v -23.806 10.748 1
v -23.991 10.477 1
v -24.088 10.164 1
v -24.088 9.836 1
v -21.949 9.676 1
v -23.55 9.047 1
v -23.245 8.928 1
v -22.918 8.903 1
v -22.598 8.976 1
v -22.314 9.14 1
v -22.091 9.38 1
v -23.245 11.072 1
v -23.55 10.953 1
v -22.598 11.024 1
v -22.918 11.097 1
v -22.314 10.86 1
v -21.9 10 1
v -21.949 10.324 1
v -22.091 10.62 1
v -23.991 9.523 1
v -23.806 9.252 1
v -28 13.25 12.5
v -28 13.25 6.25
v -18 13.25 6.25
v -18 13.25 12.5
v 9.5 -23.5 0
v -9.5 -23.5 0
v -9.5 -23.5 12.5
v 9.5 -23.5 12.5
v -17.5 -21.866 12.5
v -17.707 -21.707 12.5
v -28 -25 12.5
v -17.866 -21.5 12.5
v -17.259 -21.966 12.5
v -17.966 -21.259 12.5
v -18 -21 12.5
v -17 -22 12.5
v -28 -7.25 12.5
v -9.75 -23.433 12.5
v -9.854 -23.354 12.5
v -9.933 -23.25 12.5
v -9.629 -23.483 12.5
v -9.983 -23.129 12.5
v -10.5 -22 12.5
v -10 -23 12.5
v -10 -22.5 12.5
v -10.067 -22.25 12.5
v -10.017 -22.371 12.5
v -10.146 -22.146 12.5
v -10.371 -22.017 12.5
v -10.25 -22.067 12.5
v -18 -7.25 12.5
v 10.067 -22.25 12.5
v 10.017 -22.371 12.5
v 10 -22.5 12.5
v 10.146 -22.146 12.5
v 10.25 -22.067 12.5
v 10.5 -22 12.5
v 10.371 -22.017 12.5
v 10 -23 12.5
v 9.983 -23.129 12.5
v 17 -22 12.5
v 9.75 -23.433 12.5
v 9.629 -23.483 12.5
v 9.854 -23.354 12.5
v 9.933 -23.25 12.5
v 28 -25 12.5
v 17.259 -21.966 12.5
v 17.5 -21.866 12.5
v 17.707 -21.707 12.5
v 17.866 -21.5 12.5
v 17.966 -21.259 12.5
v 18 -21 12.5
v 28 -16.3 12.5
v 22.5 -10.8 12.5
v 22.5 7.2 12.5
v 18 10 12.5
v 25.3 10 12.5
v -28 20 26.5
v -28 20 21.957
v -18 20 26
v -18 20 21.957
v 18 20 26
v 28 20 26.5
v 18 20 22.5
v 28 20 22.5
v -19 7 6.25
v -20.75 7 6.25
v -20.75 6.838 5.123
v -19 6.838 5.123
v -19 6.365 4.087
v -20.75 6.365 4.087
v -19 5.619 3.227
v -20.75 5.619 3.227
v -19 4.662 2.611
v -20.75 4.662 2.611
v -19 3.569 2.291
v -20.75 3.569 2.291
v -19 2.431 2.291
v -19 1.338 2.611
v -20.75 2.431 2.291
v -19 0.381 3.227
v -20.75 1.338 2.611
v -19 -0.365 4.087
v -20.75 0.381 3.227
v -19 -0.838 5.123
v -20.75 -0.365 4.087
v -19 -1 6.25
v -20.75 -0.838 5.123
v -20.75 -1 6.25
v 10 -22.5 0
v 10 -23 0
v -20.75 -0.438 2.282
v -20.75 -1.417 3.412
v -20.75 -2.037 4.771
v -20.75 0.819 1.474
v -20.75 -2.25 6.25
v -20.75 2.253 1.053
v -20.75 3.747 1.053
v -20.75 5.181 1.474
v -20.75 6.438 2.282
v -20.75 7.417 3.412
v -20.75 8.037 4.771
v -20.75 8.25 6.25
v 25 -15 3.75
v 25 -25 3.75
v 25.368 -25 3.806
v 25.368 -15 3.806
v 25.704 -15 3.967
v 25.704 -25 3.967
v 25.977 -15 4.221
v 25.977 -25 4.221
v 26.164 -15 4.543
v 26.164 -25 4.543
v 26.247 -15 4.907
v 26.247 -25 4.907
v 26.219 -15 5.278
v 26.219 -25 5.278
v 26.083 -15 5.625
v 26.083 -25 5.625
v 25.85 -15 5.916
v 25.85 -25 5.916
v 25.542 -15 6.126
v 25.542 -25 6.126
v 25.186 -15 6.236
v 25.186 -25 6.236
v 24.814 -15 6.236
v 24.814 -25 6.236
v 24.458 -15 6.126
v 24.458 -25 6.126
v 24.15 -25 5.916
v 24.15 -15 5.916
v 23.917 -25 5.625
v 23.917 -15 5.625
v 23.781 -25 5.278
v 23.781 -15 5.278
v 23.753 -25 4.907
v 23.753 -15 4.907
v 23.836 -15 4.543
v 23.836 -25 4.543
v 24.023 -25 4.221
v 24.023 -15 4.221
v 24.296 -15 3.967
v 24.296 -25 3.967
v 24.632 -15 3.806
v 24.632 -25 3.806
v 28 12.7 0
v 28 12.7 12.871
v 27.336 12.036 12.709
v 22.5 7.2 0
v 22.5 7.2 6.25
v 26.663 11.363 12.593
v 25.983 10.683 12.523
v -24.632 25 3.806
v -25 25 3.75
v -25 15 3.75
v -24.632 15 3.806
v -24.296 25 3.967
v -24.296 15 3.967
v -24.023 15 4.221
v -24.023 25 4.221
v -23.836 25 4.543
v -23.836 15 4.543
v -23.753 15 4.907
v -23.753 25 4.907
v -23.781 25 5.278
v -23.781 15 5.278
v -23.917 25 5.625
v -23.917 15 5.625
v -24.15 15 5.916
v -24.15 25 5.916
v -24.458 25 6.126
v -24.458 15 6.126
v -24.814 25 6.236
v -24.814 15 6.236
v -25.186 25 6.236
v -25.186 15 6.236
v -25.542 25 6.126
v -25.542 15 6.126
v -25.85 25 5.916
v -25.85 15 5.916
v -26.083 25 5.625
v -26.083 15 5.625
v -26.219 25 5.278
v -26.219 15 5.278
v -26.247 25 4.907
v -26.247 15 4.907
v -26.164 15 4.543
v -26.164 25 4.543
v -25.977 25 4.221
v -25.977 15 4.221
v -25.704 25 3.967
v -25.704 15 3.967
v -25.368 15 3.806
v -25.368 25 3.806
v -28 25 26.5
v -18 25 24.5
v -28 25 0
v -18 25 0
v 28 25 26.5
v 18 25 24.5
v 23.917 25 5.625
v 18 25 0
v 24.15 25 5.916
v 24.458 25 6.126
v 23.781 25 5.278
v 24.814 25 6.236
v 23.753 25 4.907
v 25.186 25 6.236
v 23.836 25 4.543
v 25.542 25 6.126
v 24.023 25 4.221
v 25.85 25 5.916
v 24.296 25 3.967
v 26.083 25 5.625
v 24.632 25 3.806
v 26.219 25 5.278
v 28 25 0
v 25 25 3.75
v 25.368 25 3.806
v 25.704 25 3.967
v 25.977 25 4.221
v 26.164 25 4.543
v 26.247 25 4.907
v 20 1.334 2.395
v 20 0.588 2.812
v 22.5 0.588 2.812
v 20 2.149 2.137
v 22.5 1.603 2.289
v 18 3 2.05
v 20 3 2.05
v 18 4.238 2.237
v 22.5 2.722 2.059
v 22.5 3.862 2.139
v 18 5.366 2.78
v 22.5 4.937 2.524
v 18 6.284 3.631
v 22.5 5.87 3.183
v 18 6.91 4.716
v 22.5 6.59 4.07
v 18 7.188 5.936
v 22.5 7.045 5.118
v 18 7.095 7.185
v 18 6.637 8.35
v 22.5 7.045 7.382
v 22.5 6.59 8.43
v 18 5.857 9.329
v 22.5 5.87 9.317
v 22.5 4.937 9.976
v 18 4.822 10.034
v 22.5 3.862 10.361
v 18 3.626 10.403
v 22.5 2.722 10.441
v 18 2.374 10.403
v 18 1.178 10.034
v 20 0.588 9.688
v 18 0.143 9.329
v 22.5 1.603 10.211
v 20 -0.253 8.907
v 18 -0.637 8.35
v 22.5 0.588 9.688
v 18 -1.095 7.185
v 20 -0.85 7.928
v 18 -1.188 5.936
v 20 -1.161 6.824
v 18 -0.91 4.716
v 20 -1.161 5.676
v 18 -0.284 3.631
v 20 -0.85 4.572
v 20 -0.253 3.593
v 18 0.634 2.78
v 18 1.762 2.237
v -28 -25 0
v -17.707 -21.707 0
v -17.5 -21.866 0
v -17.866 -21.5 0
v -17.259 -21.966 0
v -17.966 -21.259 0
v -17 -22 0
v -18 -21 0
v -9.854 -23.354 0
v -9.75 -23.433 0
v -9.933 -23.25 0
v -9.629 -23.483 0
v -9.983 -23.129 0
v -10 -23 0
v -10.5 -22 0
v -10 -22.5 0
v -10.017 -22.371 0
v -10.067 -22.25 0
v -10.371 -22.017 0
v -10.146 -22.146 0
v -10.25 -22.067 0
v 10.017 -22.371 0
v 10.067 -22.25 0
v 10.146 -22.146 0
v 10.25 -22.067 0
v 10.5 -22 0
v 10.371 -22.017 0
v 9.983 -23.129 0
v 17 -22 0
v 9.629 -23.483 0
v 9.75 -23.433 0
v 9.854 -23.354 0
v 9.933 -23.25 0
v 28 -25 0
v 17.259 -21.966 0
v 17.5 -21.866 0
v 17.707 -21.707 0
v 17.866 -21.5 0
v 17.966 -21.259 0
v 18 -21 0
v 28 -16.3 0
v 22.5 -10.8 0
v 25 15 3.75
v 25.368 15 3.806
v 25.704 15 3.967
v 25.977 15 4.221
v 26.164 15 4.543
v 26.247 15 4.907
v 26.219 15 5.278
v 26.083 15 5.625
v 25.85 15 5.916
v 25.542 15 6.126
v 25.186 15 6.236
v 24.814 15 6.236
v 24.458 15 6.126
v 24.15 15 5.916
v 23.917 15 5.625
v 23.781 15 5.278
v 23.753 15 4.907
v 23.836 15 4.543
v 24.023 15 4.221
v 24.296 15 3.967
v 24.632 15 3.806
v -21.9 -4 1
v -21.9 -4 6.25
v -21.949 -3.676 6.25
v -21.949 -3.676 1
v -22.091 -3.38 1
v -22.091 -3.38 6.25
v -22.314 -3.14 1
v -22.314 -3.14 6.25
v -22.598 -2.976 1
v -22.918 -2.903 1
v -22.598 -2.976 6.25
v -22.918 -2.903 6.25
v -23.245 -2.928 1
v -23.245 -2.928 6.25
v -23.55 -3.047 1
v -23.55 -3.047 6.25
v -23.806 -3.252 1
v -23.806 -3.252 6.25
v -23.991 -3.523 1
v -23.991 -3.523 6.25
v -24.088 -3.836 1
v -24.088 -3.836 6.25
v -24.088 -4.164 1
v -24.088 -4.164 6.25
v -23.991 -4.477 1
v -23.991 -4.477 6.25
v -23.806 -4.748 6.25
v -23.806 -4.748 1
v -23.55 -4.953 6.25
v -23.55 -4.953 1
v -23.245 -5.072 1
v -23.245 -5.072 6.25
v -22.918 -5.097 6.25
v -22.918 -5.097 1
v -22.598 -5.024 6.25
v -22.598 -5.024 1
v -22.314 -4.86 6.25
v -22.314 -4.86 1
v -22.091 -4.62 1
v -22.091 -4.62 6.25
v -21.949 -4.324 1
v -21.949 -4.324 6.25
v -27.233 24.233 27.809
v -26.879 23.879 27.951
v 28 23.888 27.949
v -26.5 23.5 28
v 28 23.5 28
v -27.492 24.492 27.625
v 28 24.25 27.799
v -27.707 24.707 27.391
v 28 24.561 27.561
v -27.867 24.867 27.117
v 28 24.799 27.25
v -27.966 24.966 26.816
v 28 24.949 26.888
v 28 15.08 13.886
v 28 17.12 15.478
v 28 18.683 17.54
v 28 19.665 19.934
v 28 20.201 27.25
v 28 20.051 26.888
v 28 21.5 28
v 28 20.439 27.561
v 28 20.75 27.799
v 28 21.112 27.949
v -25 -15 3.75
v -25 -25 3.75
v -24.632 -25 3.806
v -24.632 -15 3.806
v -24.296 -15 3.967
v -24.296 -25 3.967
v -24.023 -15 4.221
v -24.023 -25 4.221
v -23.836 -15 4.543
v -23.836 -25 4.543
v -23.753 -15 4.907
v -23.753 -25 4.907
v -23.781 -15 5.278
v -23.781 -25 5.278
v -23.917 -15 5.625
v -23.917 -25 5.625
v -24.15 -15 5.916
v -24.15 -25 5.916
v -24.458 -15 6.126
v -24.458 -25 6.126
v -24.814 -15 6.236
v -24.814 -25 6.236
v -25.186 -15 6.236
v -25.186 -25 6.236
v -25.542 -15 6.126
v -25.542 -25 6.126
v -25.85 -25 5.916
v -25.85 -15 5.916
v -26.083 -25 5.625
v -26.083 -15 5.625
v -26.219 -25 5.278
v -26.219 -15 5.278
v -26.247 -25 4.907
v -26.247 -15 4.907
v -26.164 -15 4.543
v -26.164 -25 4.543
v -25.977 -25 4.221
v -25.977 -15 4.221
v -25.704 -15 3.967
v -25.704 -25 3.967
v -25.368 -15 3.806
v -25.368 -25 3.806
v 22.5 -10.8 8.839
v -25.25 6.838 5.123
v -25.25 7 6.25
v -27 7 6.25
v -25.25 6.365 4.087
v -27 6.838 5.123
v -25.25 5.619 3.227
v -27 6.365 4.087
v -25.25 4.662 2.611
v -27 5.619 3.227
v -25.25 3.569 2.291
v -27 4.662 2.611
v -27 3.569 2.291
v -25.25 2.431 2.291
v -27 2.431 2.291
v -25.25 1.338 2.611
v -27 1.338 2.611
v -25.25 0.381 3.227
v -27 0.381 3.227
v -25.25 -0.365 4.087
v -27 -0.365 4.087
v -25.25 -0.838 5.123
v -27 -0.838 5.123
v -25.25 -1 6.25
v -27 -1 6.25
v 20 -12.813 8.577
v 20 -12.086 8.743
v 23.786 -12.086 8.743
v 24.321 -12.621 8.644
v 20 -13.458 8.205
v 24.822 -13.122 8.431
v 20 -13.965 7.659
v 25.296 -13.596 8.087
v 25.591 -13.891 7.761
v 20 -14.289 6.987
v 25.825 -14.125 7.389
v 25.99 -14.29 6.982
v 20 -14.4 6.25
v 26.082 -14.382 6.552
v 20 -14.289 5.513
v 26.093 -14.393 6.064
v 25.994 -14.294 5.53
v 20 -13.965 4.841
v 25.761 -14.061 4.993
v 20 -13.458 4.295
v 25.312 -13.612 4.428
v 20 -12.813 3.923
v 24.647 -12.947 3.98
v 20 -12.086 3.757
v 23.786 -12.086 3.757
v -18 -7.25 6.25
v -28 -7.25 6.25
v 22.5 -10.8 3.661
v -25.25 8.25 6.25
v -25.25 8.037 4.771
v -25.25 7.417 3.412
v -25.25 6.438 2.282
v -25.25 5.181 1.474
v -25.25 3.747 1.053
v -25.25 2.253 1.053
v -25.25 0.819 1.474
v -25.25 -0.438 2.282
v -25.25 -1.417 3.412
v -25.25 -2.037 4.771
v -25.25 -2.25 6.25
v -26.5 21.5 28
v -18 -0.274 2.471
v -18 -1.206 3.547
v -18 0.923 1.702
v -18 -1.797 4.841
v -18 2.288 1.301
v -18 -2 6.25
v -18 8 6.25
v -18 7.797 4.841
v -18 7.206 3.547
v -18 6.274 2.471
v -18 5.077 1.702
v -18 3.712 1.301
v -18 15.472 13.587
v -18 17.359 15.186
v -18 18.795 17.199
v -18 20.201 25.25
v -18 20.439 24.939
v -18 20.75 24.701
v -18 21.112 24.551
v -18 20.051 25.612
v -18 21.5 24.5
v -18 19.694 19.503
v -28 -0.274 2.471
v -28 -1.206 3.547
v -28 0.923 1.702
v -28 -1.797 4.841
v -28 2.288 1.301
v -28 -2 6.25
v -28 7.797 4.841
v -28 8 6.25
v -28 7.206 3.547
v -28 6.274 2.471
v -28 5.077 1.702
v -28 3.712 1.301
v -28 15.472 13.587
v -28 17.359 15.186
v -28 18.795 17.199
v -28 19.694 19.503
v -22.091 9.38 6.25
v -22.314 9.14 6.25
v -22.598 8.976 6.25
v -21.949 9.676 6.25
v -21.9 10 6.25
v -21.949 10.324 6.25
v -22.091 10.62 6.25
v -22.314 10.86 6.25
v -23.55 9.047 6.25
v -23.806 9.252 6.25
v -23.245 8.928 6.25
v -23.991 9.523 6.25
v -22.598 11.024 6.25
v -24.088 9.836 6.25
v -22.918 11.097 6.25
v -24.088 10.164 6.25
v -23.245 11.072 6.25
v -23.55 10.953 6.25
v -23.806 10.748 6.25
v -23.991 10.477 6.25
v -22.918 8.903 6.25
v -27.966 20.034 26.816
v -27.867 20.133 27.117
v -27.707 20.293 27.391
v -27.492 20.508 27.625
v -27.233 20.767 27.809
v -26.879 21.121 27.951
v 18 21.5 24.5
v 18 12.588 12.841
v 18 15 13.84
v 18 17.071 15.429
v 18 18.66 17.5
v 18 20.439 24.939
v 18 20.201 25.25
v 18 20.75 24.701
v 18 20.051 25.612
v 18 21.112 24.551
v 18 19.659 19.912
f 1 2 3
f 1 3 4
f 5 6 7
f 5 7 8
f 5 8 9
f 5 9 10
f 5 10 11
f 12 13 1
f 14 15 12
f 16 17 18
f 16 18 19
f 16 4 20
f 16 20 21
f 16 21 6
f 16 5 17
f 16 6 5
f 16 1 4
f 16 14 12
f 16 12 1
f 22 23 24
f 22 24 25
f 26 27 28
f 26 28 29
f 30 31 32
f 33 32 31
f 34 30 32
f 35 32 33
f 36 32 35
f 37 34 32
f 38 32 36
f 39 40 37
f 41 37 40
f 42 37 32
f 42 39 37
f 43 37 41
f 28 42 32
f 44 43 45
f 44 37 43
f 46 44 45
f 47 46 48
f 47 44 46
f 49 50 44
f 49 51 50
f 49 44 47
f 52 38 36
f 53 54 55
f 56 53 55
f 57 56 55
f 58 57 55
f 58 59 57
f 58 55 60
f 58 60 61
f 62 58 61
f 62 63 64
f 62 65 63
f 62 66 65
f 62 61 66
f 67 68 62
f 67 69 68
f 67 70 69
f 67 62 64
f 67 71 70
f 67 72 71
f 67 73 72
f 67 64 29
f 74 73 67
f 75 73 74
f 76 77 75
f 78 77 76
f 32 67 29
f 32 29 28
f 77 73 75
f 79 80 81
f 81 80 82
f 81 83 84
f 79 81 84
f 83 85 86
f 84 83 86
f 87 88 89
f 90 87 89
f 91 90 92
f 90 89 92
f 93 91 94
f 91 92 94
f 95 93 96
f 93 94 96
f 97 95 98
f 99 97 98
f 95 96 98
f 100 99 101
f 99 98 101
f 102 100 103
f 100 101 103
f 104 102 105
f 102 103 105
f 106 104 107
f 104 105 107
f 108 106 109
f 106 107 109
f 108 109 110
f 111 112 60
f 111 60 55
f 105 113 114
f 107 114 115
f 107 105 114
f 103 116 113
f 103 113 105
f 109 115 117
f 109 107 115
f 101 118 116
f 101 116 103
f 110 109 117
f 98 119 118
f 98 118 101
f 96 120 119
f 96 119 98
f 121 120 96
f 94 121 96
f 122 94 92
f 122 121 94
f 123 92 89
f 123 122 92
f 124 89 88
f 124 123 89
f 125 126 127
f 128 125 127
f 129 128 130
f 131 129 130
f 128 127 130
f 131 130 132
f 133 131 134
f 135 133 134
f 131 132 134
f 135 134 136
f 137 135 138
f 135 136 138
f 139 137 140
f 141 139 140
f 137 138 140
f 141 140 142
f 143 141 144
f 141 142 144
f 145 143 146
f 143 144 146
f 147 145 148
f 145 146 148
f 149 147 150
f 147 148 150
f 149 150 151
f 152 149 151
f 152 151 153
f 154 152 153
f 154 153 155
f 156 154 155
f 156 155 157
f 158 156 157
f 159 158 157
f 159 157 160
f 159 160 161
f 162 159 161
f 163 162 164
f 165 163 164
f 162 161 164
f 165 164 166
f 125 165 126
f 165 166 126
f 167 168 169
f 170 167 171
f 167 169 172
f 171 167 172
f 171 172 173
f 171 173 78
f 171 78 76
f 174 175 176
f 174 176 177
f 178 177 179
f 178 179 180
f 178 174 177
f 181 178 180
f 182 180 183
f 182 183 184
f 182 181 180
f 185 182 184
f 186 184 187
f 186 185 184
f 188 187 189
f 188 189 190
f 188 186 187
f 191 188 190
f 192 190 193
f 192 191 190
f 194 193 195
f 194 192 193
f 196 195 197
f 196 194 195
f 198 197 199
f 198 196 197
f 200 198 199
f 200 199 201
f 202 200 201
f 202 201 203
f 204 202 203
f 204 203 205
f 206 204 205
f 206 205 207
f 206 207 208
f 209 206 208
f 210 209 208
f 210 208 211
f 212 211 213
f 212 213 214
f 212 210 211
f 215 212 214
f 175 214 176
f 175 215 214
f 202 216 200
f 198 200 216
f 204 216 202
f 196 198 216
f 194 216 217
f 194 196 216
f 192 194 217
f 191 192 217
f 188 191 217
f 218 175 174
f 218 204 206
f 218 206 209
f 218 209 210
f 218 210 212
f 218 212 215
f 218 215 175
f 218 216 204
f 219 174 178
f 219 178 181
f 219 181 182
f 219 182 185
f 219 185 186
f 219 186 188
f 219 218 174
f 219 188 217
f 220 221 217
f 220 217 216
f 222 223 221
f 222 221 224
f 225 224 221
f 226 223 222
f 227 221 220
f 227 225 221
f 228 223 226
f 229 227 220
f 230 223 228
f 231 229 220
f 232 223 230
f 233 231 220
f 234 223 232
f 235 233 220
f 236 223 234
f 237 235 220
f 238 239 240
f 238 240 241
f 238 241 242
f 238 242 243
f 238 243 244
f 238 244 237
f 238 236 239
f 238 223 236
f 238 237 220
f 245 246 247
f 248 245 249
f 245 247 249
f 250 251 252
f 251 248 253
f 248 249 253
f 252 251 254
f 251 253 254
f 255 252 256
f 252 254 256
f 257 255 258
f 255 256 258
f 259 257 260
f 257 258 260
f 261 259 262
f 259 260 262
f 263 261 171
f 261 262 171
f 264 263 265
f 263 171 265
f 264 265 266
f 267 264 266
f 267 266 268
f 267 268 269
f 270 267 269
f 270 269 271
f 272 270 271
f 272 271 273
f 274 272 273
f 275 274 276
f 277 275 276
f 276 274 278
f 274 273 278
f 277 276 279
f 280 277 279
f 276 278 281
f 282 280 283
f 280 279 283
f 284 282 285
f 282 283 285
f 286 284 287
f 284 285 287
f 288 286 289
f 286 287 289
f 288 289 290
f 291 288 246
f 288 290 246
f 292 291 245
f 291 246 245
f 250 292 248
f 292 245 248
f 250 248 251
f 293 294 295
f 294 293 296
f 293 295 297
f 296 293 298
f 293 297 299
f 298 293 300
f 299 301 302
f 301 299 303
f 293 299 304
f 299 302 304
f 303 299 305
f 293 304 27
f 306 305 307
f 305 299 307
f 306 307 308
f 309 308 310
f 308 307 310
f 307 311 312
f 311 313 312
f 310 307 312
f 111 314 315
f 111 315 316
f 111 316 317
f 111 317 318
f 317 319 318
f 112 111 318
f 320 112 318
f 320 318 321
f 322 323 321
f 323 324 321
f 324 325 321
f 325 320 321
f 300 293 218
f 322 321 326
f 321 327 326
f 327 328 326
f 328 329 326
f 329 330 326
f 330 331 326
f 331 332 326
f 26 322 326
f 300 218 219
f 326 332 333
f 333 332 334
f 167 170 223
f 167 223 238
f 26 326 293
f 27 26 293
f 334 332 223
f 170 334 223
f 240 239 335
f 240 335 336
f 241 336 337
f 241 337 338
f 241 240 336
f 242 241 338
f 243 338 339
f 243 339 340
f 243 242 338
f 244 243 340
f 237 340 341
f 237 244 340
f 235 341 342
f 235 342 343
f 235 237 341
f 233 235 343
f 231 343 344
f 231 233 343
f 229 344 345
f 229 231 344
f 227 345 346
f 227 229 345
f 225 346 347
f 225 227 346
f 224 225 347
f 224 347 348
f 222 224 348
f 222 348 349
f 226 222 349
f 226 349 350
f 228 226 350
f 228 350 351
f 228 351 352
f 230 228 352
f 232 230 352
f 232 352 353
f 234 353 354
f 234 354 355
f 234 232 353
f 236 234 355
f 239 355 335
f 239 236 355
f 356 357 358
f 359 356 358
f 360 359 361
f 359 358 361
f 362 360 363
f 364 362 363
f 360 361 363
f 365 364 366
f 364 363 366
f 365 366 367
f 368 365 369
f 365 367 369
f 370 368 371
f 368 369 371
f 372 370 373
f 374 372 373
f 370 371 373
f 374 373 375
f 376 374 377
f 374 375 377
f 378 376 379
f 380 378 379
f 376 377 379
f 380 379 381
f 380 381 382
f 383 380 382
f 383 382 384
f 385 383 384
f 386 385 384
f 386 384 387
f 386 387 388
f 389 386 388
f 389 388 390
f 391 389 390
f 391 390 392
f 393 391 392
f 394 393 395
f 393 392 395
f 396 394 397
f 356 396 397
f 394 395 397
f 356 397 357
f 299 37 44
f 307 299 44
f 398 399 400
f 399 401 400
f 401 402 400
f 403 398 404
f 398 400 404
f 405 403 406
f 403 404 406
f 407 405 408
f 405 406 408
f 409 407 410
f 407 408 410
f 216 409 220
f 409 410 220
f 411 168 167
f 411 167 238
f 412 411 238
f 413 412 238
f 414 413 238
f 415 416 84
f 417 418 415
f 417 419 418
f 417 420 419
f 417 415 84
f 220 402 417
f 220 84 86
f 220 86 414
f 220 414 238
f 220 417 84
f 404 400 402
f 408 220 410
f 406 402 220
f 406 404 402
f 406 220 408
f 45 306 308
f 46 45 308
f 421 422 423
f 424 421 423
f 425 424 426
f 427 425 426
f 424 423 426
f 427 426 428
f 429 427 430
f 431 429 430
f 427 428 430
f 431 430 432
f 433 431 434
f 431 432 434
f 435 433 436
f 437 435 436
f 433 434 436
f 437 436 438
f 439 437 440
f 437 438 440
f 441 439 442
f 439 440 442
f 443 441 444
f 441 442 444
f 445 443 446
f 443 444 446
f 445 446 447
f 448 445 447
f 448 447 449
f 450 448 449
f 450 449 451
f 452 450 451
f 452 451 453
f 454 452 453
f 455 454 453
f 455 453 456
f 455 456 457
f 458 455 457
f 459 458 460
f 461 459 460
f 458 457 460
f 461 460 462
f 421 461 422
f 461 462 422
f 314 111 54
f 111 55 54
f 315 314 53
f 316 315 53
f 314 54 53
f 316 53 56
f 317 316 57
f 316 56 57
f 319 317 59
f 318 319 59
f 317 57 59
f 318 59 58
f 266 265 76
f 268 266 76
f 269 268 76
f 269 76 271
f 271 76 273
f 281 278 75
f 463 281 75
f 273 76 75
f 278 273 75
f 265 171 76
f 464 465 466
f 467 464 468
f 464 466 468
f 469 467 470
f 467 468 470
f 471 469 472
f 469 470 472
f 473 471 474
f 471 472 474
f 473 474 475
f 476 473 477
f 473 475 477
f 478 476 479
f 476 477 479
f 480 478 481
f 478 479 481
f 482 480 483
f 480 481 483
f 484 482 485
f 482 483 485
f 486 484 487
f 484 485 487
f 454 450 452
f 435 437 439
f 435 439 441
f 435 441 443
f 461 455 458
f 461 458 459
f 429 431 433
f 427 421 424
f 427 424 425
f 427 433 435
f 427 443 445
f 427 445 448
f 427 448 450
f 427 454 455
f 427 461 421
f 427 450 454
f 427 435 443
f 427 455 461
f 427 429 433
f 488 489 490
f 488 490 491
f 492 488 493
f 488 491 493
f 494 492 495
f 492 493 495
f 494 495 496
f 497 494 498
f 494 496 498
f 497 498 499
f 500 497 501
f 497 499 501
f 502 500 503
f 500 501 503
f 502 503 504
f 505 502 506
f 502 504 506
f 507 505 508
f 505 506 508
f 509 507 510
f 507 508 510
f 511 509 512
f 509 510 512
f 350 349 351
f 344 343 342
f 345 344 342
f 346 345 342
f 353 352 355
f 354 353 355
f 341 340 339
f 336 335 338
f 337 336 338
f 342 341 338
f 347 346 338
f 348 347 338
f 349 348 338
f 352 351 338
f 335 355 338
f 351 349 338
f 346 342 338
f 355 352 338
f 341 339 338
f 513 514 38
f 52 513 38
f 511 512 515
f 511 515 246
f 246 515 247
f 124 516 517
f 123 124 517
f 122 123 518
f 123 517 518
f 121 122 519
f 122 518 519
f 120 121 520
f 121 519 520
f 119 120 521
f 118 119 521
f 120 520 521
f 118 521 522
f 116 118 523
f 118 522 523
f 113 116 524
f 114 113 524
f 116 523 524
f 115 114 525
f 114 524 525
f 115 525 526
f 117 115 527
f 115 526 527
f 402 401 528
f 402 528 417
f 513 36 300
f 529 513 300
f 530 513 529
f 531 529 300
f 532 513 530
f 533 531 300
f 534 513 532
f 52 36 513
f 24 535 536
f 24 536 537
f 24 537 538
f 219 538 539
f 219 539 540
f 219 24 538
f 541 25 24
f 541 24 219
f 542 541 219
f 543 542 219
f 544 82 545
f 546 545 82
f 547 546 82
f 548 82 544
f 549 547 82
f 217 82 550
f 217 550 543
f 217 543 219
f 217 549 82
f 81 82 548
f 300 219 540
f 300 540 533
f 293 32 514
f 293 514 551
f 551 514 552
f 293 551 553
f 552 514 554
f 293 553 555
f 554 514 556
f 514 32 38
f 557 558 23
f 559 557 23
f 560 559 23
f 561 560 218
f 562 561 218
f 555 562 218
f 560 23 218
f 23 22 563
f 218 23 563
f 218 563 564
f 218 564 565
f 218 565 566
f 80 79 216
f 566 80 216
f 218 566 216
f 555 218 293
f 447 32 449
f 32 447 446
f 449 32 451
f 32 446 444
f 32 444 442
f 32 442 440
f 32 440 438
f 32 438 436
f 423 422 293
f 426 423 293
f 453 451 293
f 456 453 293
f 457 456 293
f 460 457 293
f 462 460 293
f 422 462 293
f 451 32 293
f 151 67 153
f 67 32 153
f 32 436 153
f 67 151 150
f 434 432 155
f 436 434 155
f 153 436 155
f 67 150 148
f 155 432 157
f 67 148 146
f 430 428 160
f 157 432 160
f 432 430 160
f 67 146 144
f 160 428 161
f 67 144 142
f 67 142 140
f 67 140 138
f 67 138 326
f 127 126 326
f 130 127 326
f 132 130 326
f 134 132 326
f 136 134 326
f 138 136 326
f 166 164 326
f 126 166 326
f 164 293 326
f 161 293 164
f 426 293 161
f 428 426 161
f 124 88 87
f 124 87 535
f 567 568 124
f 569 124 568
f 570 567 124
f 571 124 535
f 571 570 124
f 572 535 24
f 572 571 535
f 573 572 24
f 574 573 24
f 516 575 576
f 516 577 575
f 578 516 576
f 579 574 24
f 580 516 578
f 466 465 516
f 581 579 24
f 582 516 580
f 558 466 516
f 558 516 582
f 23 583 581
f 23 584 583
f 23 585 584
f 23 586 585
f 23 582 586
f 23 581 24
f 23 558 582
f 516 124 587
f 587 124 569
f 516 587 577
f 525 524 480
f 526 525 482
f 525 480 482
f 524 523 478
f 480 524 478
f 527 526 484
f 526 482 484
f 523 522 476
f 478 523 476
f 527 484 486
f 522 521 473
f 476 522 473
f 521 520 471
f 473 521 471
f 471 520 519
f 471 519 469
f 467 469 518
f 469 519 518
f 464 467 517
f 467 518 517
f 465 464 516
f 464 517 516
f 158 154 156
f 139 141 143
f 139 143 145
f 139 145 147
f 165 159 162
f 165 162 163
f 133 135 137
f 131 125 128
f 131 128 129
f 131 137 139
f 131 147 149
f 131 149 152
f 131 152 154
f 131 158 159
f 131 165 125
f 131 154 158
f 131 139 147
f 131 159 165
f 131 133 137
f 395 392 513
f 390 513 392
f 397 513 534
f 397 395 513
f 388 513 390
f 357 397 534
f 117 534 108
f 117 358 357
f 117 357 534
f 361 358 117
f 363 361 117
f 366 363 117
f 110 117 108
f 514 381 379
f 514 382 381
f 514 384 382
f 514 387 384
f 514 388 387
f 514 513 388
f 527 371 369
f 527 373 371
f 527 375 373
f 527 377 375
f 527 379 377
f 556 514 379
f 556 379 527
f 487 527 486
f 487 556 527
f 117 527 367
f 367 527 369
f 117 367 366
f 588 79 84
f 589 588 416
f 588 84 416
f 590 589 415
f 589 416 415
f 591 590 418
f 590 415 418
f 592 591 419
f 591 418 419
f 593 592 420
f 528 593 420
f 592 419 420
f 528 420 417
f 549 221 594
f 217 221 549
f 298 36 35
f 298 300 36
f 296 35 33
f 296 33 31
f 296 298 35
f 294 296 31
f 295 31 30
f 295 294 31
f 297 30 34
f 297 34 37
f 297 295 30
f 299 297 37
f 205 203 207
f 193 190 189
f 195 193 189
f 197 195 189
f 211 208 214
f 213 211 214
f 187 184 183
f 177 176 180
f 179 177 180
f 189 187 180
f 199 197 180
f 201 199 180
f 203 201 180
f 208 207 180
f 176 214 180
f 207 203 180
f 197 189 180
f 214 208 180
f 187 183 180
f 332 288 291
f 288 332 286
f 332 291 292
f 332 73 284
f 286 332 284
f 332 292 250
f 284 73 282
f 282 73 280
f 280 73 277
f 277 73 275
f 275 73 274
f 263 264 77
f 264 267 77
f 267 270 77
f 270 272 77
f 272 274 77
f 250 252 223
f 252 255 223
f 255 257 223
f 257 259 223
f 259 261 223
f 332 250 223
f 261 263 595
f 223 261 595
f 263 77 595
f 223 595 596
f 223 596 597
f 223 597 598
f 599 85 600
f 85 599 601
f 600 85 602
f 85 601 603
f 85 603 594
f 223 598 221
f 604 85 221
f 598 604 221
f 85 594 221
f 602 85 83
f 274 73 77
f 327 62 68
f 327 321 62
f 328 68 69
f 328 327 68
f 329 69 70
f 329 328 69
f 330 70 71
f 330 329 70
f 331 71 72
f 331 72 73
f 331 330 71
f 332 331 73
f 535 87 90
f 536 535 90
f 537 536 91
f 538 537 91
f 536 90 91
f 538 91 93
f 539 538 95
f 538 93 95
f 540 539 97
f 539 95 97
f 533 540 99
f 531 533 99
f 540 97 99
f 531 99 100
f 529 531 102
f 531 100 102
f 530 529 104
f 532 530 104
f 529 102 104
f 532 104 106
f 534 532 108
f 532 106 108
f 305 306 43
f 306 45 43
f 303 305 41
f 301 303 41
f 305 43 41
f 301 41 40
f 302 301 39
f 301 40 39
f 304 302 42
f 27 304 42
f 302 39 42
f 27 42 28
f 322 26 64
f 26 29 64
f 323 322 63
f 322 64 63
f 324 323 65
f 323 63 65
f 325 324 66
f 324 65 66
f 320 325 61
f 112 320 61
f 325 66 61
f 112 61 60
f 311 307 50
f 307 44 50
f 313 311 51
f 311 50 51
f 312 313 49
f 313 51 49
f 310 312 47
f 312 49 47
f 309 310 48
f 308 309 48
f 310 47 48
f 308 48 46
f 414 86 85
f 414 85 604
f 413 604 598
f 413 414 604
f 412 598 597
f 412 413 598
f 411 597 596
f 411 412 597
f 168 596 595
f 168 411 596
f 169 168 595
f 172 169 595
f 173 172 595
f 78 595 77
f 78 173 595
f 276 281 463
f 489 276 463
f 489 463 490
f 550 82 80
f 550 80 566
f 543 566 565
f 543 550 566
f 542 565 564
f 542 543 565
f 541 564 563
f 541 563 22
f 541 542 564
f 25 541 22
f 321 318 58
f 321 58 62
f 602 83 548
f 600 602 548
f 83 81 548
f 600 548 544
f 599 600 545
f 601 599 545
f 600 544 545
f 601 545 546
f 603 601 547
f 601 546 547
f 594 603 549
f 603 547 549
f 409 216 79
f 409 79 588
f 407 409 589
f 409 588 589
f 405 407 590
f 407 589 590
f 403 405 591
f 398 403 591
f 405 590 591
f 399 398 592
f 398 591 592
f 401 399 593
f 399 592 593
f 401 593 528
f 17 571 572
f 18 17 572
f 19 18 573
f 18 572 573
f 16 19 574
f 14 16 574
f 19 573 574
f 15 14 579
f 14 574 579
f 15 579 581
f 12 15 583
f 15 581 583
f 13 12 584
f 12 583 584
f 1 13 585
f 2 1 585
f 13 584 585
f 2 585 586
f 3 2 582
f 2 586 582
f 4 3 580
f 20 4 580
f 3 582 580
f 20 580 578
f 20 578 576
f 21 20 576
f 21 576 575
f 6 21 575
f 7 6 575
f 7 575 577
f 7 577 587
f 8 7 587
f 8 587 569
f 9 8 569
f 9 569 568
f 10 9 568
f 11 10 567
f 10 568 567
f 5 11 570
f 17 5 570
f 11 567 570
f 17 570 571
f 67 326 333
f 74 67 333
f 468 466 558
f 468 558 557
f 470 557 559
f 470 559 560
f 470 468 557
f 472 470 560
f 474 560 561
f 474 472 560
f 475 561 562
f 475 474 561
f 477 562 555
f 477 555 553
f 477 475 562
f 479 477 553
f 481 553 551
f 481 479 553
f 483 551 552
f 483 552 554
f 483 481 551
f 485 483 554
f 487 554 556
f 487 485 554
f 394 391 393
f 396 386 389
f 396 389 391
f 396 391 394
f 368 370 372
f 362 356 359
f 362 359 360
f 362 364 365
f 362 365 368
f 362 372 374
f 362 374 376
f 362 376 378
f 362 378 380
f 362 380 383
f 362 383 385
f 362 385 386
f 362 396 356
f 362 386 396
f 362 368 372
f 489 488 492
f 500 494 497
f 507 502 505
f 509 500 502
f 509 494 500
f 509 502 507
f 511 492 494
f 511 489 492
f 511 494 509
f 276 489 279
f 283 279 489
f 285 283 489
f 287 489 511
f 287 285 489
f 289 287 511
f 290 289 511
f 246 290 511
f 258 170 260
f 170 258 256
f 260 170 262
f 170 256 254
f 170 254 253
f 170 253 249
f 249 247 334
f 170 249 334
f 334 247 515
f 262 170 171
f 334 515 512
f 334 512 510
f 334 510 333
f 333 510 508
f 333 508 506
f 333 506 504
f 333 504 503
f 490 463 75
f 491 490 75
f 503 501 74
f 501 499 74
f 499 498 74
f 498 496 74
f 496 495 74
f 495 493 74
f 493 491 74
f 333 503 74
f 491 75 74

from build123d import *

# Parameters (mm, degrees)
SKETCH_1_W             = 56
SKETCH_1_H             = 50
EXTRUDE_487_DEPTH      = 12.5
SKETCH_3_W             = 36
SKETCH_3_H             = 46
CUT_EXTRUDE_730_DEPTH  = 40.563240514
SKETCH_11_R            = 1.25
CUT_EXTRUDE_984_DEPTH  = 10
CUT_EXTRUDE_1451_DEPTH = 8
CUT_EXTRUDE_1793_REACH = 64.588
SKETCH_4_R             = 4.2
SKETCH_6_R             = 4
CUT_EXTRUDE_1930_DEPTH = 10
SKETCH_7_W             = 6.25
SKETCH_7_H             = 20.5
CUT_EXTRUDE_2129_DEPTH = 10
SKETCH_8_R             = 5.25
CUT_EXTRUDE_2306_DEPTH = 2.25
SKETCH_9_R             = 1.1
CUT_EXTRUDE_2664_DEPTH = 5.25
CUT_EXTRUDE_3061_DEPTH = 40.563240514
CHAMFER_1_SIZE         = 1
FILLET_1_R             = 1
SKETCH_12_W            = 20
SKETCH_12_H            = 1.5
CUT_EXTRUDE_3473_DEPTH = 40.563240514
FILLET_2_R             = 0.5
CUT_EXTRUDE_4198_REACH = 41.563
SKETCH_13_W            = 36
SKETCH_13_H            = 1
EXTRUDE_4558_DEPTH     = 5
FILLET_3_R             = 10
FILLET_4_R             = 1.5


with BuildPart() as part:
    # Эскиз1 → Extrude 487 (new body)
    with BuildSketch(Plane.XY):
        Rectangle(SKETCH_1_W, SKETCH_1_H)
    extrude(amount=EXTRUDE_487_DEPTH)

    # Эскиз3 → Cut-Extrude 730 (cut, through all)
    with BuildSketch(Plane.XY.offset(12.5)):
        with Locations((0, 1)):
            Rectangle(SKETCH_3_W, SKETCH_3_H)
    extrude(amount=-CUT_EXTRUDE_730_DEPTH, mode=Mode.SUBTRACT)

    # Эскиз11 → Cut-Extrude 984 (cut)
    with BuildSketch(Plane.XZ.offset(25)):
        with Locations(Location((-25, 5, 0), (0, 0, 270))):
            Circle(SKETCH_11_R)
        with Locations(Location((25, 5, 0), (0, 0, 270))):
            Circle(SKETCH_11_R)
    cut_extrude_984 = extrude(amount=-CUT_EXTRUDE_984_DEPTH, mode=Mode.SUBTRACT)

    # Mirror 1028: Cut-Extrude 984 across plane
    add(cut_extrude_984.mirror(Plane.ZX), mode=Mode.SUBTRACT)

    # Эскиз5 → Cut-Extrude 1451 (cut)
    with BuildSketch(Plane(origin=(28, 0, 0), x_dir=(0, 0, -1), z_dir=(1, 0, 0))):
        with BuildLine():
            Line((-9.688027281, 0.587538929), (-8.743079599, -12.085887362))
            ThreePointArc((-8.743079599, -12.085887362), (-6.25, -14.4), (-3.756920401, -12.085887362))
            Line((-3.756920401, -12.085887362), (-2.811972719, 0.587538929))
            ThreePointArc((-2.811972719, 0.587538929), (-6.25, 7.2), (-9.688027281, 0.587538929))
        make_face()
    extrude(amount=-CUT_EXTRUDE_1451_DEPTH, mode=Mode.SUBTRACT)

    # Эскиз4 → Cut-Extrude 1793 (cut, up to next)
    with BuildSketch(Plane(origin=(28, 0, 0), x_dir=(0, 0, -1), z_dir=(1, 0, 0)), mode=Mode.PRIVATE) as cut_extrude_1793_sk1:
        with Locations((-6.25, 3)):
            Circle(SKETCH_4_R)
    cut_extrude_1793_tool1 = extrude(cut_extrude_1793_sk1.sketch, amount=-CUT_EXTRUDE_1793_REACH, mode=Mode.PRIVATE) & part.part
    add(cut_extrude_1793_tool1.solids().sort_by_distance((28, 3, 6.25))[0], mode=Mode.SUBTRACT)

    # Эскиз6 → Cut-Extrude 1930 (cut)
    with BuildSketch(Plane.ZY.offset(28)):
        with Locations((6.25, 3)):
            Circle(SKETCH_6_R)
    extrude(amount=-CUT_EXTRUDE_1930_DEPTH, mode=Mode.SUBTRACT)

    # Эскиз7 → Cut-Extrude 2129 (cut)
    with BuildSketch(Plane.ZY.offset(28)):
        with Locations((9.375, 3)):
            Rectangle(SKETCH_7_W, SKETCH_7_H)
    extrude(amount=-CUT_EXTRUDE_2129_DEPTH, mode=Mode.SUBTRACT)

    # Эскиз8 → Cut-Extrude 2306 (cut, symmetric)
    with BuildSketch(Plane.ZY.offset(23)):
        with Locations((6.25, 3)):
            Circle(SKETCH_8_R)
    extrude(amount=CUT_EXTRUDE_2306_DEPTH, both=True, mode=Mode.SUBTRACT)

    # Эскиз9 → Cut-Extrude 2664 (cut)
    with BuildSketch(Plane.XY.offset(6.25)):
        with Locations((-23, 10)):
            Circle(SKETCH_9_R)
        with Locations((-23, -4)):
            Circle(SKETCH_9_R)
    extrude(amount=-CUT_EXTRUDE_2664_DEPTH, mode=Mode.SUBTRACT)

    # Эскиз10 → Cut-Extrude 3061 (cut, through all)
    with BuildSketch(Plane.XY.offset(12.5)):
        Polygon((28, -16.3), (28, 12.7), (22.5, 7.2), (22.5, -10.8), align=None)
    extrude(amount=-CUT_EXTRUDE_3061_DEPTH, mode=Mode.SUBTRACT)

    # Фаска1
    chamfer_1_edges = [part.edges().sort_by_distance(p)[0] for p in [
        (-28, 3, 2.25),
        (-18, 3, 2.25),
    ]]
    chamfer(chamfer_1_edges, length=CHAMFER_1_SIZE)

    # Скругление1
    fillet_1_edges = [part.edges().sort_by_distance(p)[0] for p in [
        (18, -22, 6.25),
        (-18, -22, 6.25),
    ]]
    fillet(fillet_1_edges, radius=FILLET_1_R)

    # Эскиз12 → Cut-Extrude 3473 (cut, through all)
    with BuildSketch(Plane.XY):
        with Locations((0, -22.75)):
            Rectangle(SKETCH_12_W, SKETCH_12_H)
    extrude(amount=CUT_EXTRUDE_3473_DEPTH, mode=Mode.SUBTRACT)

    # Скругление2
    fillet_2_edges = [part.edges().sort_by_distance(p)[0] for p in [
        (-10, -22, 6.25),
        (-10, -23.5, 6.25),
        (10, -23.5, 6.25),
        (10, -22, 6.25),
    ]]
    fillet(fillet_2_edges, radius=FILLET_2_R)

    # Эскиз13 → Cut-Extrude 4198 (cut, up to next)
    with BuildSketch(Plane.XY.offset(12.5), mode=Mode.PRIVATE) as cut_extrude_4198_sk1:
        with Locations((0, 24.5)):
            Rectangle(SKETCH_13_W, SKETCH_13_H)
    cut_extrude_4198_tool1 = extrude(cut_extrude_4198_sk1.sketch, amount=-CUT_EXTRUDE_4198_REACH, mode=Mode.PRIVATE) & part.part
    add(cut_extrude_4198_tool1.solids().sort_by_distance((0, 24.5, 12.5))[0], mode=Mode.SUBTRACT)

    # Эскиз14 → Extrude 4558 (add)
    with BuildSketch(Plane(origin=(0, 25, 0), x_dir=(1, 0, 0), z_dir=(0, 1, 0))):
        Polygon((-28, -12.5), (-28, -28), (28, -28), (28, -12.5), (18, -12.5), (18, -24.5), (-18, -24.5), (-18, -12.5), align=None)
    extrude(amount=-EXTRUDE_4558_DEPTH)

    # Скругление3
    # the kernel refuses this fillet: 10 mm, written as the material it adds along each edge
    with BuildSketch(Plane(origin=(28, 20, 12.5), x_dir=(0, -1, 0), z_dir=(-1, 0, 0))) as fillet_3_piece_1_section:
        with BuildLine():
            CenterArc((FILLET_3_R, FILLET_3_R), FILLET_3_R, 180, 90)
            Line((0, FILLET_3_R), (0, 0))
            Line((0, 0), (FILLET_3_R, 0))
        make_face()
    fillet_3_piece_1 = extrude(amount=10, mode=Mode.PRIVATE)
    fillet_3_piece_1 = split(fillet_3_piece_1, bisect_by=Plane(origin=(31.65, 16.35, 12.5), z_dir=(-0.7071067811865515, 0.7071067811865436, 0)), keep=Keep.TOP, mode=Mode.PRIVATE)
    add(fillet_3_piece_1)
    with BuildSketch(Plane(origin=(-18, 20, 12.5), x_dir=(0, -1, 0), z_dir=(-1, 0, 0))) as fillet_3_piece_2:
        with BuildLine():
            CenterArc((10, 9.45714016), FILLET_3_R, 180, 71.034425011)
            Line((0, 9.45714016), (0, 0))
            Line((0, 0), (6.75, 0))
        make_face()
    extrude(amount=10)

    # Скругление4
    fillet_4_edges = [part.edges().sort_by_distance(p)[0] for p in [
        (0, 20, 24.5),
        (0, 20, 28),
        (-28, 22.5, 28),
        (0, 25, 28),
    ]]
    fillet(fillet_4_edges, radius=FILLET_4_R)


solid = part.part
